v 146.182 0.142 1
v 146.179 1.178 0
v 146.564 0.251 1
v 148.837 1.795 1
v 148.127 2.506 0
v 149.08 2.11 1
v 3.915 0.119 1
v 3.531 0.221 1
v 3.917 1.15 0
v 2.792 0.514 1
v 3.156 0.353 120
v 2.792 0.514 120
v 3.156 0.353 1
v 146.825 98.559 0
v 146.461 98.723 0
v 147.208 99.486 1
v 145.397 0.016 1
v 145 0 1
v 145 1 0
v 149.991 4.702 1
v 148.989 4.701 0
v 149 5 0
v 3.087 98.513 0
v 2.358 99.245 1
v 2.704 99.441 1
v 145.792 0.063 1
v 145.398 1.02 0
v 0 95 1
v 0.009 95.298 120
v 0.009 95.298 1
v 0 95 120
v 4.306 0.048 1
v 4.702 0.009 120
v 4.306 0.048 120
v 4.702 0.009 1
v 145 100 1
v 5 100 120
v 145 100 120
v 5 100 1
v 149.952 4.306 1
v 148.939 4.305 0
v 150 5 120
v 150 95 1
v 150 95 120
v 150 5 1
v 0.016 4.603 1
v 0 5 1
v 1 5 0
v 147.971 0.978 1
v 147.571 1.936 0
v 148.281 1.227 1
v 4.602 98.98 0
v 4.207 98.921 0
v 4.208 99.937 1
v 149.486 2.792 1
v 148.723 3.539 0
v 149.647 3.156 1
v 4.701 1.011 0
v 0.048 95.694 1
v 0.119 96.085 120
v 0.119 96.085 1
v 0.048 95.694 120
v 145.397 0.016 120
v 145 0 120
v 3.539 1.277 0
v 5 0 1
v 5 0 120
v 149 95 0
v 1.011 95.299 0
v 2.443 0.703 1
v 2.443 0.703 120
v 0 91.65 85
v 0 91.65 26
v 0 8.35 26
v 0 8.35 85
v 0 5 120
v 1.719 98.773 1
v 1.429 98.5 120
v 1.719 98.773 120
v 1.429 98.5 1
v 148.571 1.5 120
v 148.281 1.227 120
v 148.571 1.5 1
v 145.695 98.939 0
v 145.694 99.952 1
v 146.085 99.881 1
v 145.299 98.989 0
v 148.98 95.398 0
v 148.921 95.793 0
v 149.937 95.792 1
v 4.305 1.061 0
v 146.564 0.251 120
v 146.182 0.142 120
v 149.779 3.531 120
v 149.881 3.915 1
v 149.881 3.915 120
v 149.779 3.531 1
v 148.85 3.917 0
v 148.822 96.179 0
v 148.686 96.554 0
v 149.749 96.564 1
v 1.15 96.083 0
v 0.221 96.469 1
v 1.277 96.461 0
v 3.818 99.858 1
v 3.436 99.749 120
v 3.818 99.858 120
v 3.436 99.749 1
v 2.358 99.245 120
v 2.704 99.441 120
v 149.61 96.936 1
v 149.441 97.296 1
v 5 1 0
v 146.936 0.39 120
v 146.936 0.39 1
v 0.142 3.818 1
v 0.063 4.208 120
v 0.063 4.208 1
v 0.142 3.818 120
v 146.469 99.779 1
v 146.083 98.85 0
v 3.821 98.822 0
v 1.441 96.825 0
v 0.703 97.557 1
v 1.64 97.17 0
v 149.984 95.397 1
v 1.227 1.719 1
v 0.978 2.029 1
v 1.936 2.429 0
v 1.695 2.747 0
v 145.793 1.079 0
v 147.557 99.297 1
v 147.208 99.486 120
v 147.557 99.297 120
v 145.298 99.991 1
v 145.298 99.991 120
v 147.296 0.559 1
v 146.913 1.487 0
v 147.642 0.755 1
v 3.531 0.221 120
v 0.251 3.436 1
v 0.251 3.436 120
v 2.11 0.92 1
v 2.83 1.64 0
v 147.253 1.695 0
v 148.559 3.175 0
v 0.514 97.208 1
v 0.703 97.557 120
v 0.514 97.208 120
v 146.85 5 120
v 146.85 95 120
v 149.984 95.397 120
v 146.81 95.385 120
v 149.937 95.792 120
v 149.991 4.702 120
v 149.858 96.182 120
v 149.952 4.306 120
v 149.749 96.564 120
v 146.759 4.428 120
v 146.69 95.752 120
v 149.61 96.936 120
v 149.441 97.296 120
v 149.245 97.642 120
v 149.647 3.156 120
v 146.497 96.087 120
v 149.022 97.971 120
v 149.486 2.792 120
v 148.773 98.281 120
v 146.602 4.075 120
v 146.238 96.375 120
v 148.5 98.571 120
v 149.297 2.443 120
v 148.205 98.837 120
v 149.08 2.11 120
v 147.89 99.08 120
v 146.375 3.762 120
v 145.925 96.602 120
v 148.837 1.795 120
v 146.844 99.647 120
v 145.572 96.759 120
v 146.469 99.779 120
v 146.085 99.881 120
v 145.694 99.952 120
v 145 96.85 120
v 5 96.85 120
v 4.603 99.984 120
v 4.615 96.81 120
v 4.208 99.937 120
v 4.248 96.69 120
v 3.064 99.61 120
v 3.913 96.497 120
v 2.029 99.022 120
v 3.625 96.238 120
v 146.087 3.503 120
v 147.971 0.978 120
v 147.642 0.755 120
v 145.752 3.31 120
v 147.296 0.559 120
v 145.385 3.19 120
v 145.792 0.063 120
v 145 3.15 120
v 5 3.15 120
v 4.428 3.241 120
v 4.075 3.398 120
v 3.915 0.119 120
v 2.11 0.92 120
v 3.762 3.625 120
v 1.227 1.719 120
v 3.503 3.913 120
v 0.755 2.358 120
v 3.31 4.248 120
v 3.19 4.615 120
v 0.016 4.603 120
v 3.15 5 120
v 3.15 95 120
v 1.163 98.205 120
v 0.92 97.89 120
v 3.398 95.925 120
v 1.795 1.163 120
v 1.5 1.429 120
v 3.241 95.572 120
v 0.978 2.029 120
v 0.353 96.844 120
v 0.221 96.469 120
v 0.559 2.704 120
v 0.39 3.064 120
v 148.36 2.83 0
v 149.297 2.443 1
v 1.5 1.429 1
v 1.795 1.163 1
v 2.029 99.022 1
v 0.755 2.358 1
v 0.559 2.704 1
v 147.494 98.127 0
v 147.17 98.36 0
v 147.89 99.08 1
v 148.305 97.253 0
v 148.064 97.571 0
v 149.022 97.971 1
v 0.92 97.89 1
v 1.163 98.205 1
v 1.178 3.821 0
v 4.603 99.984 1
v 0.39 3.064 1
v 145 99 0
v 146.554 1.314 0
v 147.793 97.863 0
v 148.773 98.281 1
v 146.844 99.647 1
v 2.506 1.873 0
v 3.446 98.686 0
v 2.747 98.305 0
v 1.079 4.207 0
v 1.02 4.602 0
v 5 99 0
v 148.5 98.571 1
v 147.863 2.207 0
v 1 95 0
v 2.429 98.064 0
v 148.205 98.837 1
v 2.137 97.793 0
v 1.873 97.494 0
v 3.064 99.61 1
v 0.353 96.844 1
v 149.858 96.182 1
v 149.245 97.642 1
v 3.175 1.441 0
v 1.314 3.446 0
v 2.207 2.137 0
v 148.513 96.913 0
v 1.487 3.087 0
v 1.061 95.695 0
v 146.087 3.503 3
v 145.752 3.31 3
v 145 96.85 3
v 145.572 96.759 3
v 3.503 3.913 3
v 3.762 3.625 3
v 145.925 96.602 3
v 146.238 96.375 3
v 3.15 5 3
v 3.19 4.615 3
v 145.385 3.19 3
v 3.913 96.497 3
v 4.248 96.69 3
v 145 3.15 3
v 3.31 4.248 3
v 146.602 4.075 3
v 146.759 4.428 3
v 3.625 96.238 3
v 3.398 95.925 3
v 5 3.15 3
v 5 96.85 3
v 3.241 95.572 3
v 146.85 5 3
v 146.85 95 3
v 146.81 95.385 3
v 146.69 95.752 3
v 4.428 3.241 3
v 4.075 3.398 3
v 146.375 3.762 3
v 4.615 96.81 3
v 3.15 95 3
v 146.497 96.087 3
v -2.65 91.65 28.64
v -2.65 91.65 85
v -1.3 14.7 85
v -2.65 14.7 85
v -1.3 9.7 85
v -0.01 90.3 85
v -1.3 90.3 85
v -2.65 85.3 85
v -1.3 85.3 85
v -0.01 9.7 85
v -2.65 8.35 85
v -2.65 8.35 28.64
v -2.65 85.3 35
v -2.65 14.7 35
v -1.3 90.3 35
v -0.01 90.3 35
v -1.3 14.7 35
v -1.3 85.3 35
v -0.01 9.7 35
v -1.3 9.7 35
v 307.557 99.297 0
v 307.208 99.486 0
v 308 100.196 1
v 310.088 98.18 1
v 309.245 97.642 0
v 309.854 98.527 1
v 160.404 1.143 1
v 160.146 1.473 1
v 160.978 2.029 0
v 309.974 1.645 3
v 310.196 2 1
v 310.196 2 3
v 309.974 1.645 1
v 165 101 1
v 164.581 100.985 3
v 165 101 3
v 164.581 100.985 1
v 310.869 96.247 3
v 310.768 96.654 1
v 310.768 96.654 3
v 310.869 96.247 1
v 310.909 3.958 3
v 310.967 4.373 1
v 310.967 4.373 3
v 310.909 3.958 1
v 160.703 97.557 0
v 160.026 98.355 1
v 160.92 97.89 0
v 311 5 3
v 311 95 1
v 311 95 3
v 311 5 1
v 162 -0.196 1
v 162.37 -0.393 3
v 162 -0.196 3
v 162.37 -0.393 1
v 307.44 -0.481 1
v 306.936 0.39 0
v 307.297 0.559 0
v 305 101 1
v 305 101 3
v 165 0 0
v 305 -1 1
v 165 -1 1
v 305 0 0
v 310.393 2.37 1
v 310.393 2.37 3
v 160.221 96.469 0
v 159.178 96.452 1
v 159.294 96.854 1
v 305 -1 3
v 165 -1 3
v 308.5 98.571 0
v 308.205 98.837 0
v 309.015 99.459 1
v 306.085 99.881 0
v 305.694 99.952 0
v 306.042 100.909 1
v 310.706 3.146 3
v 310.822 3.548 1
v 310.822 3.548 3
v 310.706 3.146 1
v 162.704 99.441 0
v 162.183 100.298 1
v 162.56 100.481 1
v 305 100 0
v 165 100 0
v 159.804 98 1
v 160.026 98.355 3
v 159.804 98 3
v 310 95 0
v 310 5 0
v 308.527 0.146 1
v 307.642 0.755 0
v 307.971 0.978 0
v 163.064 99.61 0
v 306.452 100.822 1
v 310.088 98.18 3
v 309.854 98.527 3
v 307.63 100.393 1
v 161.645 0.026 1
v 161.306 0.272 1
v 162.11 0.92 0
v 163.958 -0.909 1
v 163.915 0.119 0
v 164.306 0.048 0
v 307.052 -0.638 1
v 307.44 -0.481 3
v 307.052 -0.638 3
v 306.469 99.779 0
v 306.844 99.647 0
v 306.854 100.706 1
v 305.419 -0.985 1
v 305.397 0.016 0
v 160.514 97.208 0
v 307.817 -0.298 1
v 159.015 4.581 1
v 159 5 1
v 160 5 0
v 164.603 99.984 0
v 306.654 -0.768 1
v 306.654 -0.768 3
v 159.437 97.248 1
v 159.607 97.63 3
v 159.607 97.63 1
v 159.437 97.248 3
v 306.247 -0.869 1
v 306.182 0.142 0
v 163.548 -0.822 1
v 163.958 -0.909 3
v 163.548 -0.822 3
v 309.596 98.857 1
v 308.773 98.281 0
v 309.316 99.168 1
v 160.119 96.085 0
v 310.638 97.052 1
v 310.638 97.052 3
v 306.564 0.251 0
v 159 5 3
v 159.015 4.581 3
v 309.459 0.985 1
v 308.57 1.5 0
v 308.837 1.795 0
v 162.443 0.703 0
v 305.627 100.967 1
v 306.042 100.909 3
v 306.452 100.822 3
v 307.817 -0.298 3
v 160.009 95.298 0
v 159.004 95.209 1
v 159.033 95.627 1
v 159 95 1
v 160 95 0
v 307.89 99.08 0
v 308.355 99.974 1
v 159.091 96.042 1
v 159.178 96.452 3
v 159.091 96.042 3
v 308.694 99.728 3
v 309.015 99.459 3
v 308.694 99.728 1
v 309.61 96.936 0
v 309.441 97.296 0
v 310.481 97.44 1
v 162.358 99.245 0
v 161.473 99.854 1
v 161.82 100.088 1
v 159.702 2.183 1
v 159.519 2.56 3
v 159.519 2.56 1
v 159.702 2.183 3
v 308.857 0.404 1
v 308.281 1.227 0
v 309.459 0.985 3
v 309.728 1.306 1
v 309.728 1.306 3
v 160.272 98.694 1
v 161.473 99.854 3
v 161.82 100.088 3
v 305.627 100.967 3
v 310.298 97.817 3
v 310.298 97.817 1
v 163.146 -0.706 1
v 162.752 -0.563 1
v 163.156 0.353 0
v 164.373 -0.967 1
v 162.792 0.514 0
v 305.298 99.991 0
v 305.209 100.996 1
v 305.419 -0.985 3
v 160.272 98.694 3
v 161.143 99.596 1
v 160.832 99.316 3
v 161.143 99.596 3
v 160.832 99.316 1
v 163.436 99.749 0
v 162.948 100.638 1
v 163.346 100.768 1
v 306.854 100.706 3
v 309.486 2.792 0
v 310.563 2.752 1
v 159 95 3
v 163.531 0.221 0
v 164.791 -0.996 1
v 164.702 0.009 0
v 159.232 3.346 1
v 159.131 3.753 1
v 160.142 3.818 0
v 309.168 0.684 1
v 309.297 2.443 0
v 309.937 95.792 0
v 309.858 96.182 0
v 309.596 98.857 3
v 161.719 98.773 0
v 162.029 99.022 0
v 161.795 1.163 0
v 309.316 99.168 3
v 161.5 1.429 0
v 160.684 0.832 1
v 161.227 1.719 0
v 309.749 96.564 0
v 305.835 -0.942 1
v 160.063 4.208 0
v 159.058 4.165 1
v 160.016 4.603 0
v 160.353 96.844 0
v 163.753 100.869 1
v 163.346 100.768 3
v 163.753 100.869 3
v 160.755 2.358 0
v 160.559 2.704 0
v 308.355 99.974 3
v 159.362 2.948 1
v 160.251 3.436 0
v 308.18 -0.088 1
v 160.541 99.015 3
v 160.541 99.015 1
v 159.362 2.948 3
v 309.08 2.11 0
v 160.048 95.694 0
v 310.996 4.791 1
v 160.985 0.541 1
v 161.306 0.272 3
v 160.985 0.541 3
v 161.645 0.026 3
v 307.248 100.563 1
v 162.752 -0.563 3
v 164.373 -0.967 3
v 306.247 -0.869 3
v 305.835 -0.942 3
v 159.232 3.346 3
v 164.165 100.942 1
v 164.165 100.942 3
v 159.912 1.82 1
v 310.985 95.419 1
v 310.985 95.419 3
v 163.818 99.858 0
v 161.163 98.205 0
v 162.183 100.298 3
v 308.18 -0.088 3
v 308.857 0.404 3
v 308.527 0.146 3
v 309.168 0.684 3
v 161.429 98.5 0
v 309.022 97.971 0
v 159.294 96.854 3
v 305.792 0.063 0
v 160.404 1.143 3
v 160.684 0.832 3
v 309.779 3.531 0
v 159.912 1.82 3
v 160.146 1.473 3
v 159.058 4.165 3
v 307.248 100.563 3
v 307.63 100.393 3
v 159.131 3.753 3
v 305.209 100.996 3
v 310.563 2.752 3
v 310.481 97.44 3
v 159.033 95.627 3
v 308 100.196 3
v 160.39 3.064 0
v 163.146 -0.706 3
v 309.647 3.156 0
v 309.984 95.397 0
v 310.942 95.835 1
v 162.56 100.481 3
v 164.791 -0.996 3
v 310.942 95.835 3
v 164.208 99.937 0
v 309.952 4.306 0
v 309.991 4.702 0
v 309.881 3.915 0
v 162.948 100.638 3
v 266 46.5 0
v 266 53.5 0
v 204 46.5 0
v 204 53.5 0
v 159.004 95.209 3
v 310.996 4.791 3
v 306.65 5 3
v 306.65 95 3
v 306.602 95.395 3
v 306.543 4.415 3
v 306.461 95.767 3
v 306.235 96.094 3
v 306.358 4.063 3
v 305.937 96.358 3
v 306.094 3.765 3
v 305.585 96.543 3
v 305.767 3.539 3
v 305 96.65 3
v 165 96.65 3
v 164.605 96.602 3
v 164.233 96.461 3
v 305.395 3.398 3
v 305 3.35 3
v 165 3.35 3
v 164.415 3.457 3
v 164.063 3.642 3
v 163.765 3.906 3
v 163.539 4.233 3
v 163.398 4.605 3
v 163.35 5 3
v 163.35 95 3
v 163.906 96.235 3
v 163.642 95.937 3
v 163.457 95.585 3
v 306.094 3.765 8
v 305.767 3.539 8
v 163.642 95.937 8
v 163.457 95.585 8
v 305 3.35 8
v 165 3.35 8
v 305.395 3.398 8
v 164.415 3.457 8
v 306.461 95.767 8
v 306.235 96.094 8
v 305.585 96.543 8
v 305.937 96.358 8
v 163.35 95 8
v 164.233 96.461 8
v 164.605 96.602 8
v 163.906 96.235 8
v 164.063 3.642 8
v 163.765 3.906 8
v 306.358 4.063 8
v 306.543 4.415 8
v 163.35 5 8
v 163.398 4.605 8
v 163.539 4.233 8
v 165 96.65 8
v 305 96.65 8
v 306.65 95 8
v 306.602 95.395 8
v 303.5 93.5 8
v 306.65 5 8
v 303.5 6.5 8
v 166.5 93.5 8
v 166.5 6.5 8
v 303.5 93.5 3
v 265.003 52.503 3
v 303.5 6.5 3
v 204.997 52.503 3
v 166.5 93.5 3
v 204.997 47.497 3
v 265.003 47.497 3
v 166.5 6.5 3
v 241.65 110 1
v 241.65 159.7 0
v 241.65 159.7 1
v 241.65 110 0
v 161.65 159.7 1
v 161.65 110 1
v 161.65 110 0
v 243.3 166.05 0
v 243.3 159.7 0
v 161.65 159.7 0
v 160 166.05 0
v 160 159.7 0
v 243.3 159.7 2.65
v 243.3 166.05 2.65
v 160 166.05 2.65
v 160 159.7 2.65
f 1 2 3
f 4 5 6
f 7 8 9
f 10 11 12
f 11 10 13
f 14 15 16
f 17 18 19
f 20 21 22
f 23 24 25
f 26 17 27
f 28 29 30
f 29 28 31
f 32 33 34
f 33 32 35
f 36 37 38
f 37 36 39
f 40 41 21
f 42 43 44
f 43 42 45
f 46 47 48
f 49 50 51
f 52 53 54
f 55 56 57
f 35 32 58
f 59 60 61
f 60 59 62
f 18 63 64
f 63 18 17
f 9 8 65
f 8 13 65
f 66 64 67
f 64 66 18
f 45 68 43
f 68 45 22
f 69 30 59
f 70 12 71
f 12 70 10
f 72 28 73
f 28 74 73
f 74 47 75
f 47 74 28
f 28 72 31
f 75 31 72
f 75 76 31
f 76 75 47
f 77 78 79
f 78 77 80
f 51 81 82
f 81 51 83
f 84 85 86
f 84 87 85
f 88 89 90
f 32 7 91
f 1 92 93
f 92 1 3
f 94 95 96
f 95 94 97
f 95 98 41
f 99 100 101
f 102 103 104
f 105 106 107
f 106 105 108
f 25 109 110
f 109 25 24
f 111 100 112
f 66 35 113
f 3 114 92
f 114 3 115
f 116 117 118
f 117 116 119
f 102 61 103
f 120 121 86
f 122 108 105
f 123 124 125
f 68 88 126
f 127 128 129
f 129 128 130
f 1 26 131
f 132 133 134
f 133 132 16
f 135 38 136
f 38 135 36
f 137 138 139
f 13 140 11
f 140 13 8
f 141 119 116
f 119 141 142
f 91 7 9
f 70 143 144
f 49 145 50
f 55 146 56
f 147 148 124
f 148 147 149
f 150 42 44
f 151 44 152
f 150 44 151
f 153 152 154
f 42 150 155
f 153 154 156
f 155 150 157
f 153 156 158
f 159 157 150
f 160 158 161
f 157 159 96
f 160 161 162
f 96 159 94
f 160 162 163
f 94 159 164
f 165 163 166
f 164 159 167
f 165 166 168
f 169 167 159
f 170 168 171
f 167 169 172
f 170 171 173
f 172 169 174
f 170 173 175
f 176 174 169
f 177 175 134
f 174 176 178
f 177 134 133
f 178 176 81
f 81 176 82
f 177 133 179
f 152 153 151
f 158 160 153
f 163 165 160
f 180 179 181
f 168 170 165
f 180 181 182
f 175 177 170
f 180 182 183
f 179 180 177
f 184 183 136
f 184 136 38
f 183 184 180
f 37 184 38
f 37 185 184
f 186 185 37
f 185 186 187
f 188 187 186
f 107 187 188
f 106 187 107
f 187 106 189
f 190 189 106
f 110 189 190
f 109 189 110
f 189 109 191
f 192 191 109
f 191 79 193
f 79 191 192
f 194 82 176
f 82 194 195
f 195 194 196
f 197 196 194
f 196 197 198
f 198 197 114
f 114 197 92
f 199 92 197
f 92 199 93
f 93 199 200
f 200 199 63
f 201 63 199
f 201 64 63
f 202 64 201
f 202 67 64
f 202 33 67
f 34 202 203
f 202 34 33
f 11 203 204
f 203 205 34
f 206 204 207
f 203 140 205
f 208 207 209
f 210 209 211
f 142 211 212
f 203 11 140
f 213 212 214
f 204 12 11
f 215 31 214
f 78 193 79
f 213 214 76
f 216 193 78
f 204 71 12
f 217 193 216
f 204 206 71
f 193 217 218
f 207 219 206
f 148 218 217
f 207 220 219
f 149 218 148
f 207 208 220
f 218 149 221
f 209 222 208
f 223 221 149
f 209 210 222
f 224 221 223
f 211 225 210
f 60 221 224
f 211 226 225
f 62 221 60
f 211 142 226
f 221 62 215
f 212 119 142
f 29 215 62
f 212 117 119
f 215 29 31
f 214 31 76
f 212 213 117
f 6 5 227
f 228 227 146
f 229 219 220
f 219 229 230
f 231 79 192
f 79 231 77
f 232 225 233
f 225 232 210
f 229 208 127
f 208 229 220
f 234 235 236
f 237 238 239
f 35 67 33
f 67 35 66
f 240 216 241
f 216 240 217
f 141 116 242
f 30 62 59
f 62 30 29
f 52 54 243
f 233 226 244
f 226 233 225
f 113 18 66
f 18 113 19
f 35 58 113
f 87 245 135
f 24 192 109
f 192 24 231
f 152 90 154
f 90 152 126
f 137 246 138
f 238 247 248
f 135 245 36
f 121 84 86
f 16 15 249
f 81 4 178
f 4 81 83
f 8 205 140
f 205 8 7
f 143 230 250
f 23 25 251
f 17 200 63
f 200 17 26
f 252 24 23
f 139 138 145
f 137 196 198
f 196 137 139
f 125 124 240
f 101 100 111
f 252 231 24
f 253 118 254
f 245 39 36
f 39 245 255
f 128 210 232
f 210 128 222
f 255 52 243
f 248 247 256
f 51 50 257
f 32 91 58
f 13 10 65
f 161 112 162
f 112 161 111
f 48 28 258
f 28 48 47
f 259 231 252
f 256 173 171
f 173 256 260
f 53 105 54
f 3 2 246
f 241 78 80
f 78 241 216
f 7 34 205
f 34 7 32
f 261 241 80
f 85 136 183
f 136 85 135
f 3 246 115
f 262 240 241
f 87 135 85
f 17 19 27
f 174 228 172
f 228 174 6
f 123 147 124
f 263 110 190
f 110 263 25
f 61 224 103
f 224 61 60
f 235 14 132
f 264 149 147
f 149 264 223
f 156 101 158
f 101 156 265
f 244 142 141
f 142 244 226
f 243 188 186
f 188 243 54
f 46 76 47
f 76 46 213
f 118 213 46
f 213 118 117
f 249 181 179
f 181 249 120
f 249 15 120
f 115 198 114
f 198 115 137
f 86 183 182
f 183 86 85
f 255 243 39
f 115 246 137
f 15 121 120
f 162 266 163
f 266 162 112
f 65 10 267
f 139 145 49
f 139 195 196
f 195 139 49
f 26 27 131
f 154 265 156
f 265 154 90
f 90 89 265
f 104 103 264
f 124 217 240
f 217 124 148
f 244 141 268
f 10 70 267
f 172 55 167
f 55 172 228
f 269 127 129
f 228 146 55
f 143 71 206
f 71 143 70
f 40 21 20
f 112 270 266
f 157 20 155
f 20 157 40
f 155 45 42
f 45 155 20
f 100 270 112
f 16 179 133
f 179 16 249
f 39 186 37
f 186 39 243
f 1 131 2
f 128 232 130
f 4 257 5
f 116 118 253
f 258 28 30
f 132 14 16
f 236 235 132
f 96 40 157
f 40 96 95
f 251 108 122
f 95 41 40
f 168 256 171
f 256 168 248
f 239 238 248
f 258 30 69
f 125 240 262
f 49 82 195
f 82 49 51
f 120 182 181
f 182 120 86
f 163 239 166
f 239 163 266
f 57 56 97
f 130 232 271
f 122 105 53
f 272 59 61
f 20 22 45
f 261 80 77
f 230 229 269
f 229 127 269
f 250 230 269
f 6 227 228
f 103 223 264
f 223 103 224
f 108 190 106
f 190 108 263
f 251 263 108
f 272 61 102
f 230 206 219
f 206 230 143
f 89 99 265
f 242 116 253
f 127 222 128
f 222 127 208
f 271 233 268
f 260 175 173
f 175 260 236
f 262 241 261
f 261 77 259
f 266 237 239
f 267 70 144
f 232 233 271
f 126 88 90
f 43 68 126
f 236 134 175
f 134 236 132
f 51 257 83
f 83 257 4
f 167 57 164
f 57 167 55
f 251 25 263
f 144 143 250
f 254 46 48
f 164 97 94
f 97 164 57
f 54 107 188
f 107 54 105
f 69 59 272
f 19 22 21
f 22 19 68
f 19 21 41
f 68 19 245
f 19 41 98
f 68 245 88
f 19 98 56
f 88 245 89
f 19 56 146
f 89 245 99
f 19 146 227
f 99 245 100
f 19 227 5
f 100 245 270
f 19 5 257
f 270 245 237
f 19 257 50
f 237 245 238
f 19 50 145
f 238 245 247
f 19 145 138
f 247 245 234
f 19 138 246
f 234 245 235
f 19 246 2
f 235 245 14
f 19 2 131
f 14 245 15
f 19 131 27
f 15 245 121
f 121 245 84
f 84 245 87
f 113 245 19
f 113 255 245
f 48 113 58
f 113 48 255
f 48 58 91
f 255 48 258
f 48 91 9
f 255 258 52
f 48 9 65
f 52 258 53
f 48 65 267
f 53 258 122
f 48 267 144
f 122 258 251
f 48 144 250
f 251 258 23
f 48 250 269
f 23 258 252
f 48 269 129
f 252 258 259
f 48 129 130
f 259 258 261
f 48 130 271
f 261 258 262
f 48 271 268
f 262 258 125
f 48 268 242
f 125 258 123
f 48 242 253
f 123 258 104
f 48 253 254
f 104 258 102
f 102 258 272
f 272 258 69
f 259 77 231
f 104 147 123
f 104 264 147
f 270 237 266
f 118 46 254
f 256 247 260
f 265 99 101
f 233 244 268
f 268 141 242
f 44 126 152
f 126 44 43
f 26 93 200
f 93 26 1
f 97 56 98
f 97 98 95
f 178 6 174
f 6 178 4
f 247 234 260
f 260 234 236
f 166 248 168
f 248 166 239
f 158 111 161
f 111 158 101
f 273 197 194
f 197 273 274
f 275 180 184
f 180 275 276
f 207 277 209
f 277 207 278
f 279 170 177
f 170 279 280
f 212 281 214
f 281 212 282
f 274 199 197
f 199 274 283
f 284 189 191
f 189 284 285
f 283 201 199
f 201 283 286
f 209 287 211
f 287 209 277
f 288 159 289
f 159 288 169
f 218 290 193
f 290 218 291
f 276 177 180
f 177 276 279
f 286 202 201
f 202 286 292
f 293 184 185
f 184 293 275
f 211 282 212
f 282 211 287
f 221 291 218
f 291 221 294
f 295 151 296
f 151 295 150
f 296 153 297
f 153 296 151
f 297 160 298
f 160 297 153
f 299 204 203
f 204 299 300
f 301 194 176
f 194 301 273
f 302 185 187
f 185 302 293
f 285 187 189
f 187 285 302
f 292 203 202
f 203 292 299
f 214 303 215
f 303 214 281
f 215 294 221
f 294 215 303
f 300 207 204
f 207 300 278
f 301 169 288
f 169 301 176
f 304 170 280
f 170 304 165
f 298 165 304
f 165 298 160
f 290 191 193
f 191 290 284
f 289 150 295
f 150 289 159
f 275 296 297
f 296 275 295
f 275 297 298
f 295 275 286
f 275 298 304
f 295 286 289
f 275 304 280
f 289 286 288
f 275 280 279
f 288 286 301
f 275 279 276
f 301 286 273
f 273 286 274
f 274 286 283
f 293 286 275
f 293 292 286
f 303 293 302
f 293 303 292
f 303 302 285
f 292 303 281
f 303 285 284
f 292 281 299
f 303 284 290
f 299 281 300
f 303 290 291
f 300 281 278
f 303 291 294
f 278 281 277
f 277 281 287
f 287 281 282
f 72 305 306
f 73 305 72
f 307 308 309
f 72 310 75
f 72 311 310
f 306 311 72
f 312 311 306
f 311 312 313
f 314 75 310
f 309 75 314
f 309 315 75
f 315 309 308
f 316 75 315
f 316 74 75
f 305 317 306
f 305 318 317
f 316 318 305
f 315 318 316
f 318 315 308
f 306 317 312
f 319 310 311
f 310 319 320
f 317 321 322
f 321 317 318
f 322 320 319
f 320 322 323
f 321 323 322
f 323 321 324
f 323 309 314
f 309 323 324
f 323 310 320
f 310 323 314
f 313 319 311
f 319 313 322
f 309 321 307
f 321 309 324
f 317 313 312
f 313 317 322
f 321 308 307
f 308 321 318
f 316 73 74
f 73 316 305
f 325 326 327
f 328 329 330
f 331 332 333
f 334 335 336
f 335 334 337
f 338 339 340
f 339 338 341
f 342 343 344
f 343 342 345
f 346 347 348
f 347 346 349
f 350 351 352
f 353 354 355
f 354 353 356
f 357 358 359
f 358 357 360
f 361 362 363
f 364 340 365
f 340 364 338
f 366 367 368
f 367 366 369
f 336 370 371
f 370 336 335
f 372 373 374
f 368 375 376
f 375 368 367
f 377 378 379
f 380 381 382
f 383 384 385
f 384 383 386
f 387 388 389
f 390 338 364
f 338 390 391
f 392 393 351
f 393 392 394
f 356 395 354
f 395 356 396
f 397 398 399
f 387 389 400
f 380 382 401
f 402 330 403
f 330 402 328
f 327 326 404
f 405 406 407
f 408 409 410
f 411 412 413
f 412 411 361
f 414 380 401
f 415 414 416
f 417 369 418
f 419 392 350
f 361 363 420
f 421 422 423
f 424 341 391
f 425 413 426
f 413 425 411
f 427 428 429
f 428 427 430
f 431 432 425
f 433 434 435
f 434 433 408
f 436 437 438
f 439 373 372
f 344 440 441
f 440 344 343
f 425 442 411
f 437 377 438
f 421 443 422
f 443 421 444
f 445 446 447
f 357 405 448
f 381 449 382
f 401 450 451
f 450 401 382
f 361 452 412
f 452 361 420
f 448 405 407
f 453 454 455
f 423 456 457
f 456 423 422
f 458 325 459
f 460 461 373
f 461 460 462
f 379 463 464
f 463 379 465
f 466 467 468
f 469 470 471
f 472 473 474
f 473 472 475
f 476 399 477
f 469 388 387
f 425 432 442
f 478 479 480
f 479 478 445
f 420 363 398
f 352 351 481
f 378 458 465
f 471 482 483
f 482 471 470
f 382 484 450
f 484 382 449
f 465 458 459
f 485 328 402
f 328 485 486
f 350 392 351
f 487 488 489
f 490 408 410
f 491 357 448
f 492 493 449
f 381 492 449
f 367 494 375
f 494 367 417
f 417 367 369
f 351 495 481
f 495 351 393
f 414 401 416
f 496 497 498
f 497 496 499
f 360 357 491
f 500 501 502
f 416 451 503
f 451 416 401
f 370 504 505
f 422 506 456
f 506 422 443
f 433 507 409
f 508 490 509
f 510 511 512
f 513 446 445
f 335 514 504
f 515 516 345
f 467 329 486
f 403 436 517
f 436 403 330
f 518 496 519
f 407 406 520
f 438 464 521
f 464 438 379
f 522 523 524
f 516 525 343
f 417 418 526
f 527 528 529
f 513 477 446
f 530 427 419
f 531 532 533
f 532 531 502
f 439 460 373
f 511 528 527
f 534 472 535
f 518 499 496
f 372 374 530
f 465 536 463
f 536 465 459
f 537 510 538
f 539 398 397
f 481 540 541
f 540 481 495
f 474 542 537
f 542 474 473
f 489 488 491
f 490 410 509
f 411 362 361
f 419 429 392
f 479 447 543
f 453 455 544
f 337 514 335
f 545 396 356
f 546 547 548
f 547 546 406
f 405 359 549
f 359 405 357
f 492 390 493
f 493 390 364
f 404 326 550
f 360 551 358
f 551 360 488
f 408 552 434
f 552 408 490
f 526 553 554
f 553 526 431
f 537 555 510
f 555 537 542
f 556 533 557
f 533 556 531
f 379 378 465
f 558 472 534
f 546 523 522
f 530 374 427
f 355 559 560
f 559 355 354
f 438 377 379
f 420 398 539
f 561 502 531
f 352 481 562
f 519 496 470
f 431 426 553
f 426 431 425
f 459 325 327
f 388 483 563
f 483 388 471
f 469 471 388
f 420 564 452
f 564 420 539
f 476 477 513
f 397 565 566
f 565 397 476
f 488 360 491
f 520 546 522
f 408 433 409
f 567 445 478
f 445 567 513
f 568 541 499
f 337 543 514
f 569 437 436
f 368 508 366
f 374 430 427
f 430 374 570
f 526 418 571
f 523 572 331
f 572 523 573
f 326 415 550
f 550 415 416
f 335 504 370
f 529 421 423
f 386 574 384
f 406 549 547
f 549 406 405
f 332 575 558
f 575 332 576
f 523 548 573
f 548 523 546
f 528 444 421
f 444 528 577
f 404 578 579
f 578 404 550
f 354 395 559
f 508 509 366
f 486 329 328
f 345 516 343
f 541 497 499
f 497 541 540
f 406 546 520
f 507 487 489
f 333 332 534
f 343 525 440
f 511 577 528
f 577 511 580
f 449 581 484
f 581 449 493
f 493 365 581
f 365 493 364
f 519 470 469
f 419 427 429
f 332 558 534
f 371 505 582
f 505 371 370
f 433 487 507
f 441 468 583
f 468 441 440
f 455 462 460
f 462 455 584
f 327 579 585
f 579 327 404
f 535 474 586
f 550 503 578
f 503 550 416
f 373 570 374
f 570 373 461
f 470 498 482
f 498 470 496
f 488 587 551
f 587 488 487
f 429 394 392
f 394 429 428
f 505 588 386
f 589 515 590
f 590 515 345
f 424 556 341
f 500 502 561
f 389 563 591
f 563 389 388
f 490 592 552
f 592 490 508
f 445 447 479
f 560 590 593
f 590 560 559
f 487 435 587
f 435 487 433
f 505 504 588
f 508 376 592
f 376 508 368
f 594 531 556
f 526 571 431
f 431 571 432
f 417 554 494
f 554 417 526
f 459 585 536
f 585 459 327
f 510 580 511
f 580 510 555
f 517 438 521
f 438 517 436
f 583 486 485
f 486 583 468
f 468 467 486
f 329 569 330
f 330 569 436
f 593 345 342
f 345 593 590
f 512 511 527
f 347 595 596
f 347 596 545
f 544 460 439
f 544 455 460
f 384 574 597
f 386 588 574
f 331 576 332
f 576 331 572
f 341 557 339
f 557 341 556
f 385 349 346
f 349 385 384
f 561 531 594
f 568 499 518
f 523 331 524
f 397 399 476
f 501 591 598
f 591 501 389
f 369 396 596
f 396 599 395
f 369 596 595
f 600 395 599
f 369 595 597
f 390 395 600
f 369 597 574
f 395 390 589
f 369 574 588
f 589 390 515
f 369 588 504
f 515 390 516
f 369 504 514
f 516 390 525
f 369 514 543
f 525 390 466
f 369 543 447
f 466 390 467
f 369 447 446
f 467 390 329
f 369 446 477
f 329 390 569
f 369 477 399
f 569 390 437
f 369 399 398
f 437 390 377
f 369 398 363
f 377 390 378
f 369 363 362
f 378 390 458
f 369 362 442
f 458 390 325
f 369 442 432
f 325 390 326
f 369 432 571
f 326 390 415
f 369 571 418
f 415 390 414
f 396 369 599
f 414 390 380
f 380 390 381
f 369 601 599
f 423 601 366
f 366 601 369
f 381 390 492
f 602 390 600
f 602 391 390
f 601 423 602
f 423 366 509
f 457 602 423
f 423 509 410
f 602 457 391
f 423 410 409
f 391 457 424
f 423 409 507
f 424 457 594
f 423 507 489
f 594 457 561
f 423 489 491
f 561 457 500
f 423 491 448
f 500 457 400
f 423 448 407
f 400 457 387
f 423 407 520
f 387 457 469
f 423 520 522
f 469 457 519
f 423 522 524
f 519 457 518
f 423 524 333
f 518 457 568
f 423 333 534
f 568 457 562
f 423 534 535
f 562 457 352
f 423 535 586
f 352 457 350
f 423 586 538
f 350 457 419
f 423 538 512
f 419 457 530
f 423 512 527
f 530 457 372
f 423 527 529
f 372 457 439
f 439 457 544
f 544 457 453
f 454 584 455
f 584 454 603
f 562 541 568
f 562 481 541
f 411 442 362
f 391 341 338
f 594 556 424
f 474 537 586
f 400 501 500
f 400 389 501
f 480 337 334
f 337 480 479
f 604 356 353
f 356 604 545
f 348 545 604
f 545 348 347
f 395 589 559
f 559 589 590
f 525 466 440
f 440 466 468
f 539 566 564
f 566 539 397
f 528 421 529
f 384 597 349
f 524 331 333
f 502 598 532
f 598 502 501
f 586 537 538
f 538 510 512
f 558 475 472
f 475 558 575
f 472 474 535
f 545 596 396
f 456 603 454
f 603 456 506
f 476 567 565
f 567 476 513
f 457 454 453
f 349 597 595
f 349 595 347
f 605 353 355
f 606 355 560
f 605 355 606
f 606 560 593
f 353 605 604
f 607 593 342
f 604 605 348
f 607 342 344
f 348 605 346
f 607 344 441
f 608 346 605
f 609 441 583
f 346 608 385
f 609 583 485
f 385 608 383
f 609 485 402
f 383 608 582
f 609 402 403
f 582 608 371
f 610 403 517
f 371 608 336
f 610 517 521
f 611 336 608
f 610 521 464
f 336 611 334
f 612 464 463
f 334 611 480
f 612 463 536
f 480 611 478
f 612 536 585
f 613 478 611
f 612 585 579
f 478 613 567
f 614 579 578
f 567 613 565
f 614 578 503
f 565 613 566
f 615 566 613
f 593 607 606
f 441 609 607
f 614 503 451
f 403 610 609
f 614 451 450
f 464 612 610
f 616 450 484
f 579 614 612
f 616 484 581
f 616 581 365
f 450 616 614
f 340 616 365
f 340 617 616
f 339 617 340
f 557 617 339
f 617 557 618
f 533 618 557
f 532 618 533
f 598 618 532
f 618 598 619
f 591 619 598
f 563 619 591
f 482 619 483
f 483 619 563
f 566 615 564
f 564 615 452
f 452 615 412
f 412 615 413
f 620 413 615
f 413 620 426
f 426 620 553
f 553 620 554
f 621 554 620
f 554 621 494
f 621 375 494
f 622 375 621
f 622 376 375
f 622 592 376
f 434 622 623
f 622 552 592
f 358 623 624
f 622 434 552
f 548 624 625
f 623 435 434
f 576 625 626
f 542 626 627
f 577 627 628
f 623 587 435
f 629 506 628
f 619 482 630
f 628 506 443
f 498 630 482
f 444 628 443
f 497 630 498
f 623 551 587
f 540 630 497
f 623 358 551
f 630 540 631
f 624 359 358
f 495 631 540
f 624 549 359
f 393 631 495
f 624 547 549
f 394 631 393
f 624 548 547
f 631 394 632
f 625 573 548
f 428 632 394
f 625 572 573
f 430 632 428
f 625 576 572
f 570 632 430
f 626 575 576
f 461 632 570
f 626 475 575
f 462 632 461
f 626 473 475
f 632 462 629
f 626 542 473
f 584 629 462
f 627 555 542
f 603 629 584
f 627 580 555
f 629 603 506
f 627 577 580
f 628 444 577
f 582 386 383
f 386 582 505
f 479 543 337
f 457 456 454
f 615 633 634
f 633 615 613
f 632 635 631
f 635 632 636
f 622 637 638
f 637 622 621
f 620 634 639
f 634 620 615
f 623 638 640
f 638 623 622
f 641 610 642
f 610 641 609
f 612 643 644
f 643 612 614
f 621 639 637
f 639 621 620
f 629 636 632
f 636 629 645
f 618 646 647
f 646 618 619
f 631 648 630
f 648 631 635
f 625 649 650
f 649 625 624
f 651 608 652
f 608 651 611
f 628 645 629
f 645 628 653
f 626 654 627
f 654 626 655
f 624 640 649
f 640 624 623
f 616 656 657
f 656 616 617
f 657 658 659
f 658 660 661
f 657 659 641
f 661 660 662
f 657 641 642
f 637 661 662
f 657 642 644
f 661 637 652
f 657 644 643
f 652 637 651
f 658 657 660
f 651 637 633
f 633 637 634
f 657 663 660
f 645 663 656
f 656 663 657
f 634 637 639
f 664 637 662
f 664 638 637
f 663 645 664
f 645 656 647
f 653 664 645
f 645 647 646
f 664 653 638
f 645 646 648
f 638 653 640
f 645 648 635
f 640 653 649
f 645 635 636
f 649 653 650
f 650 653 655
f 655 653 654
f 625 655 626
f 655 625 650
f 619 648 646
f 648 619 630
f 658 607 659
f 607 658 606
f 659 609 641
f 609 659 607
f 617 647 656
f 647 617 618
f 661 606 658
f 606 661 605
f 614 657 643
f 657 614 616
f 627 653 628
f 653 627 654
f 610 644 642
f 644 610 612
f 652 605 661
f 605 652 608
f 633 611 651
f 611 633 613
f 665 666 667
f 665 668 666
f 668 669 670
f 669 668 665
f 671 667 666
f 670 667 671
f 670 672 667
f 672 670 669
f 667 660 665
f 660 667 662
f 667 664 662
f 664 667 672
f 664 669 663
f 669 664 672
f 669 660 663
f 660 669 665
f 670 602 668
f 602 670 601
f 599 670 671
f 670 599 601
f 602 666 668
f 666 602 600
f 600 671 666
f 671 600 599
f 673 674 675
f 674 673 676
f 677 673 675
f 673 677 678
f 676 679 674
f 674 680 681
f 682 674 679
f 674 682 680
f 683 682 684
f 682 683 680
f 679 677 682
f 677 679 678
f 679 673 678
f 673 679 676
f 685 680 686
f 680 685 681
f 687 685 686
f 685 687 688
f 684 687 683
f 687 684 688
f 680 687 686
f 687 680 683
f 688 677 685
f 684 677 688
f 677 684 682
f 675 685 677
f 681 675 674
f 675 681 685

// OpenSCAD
// Main part file. Open in OpenSCAD: F5 preview, F6 render.
// Viewed from above, X is to the right (width) and Y is away from you (depth).
//
// The box is open at the top. The lid is a plate the full outer size of the
// box, with a ring underneath that steps inwards and drops inside the box
// walls to hold the lid in place.
//
// The front of the box can carry a holder for a sign: a channel on the
// outside of the wall, open at the top, that a flat sign card drops into. The
// sides of the channel overhang the edges of the card to hold it against the
// wall.
//
// Notes:
// - The lid is modelled upside down, plate on the bed, so it prints without
//   supports.
// - Keep comments on parameters to a single line: the single-file build
//   (make dist) drops comments that continue over several lines.

/* [Part] */
part = "all"; // [box, lid, sign, all]

/* [Box] */
width           = 150; // mm, outer, along X
depth           = 100; // mm, outer, along Y
height          = 120; // mm, outer, box only, not including the lid
wall_thickness  = 0;   // mm, side walls and the lid ring, 0 = auto from the box size
floor_thickness = 3;   // mm

/* [Finish] */
corner_radius = 5; // mm, vertical corners of the box and lid
edge_chamfer  = 1; // mm, 45 degree chamfer on the bottom edge of the box and the top edge of the lid
slot_chamfer  = 1; // mm, 45 degree chamfer round the top of the money slot
lid_overhang  = 1; // mm, how far the lid sticks out past the box on every side, hides the seam

/* [Printing] */
line_width = 0.45; // mm, slicer extrusion width, auto sizes are a whole number of lines

/* [Lid] */
lid_thickness = 3;   // mm, top plate
ring_height   = 5;   // mm, how far the ring under the lid reaches down into the box
clearance     = 0.2; // mm, gap on each side between the lid ring and the box walls
slot_length   = 60;  // mm, along X
slot_width    = 5;   // mm, along Y

/* [Sign] */
add_sign_holder    = true;  // add a holder for a sign card on the front of the box
sign_on_short_side = true; // put the holder on a short side of the box instead of a long side
sign_width         = 80;   // mm, card, the part that slides into the holder
sign_height        = 50;   // mm, card, the part that slides into the holder, not including the lip
sign_thickness     = 1;     // mm, card
sign_overhang      = 5;     // mm, how far each side of the holder covers the edge of the card
sign_base          = 0;     // mm, thickness of the ledge the card stands on, 0 = auto (same as the sides)
sign_clearance     = 0.3;   // mm, gap around the card in the holder
sign_holder_thickness = 0;  // mm, sides and front of the holder, 0 = auto (3 lines)

/* [Hidden] */
part_gap = 10; // mm, space between the parts when part = "all"
eps      = 0.01;
$fa      = 4;
$fs      = 0.4;

// Auto wall: about 1 mm per 50 mm of the largest dimension, clamped to
// 1.2-4 mm, then rounded up to a whole number of lines.
wall = wall_thickness > 0
    ? wall_thickness
    : ceil(min(max(max(width, depth, height) / 50, 1.2), 4) / line_width) * line_width;

// Inset from the outer edge to the outside and inside of the lid ring.
ring_outer_inset = wall + clearance;
ring_inner_inset = ring_outer_inset + wall;

// The sign holder goes on the front (Y = 0) face when that is the side asked
// for, otherwise on the left (X = 0) face.
sign_along_x = (width >= depth) != sign_on_short_side;
sign_face    = sign_along_x ? width : depth;

// Sign holder sizes: the channel the card sits in, and the holder overall.
holder_wall         = sign_holder_thickness > 0 ? sign_holder_thickness : 3 * line_width;
sign_slot_width     = sign_width + 2 * sign_clearance;
sign_slot_thickness = sign_thickness + sign_clearance;
holder_width        = sign_slot_width + 2 * holder_wall;
holder_thickness    = sign_slot_thickness + holder_wall;
// Width of the frame around the sign as seen from the front: the sides of the
// holder, the ledge at the bottom and the lip on the card at the top.
frame_border        = holder_wall + sign_overhang;
holder_base         = sign_base > 0 ? sign_base : frame_border;
holder_height       = holder_base + sign_height; // card top, below the lip, is flush with the holder top
holder_z            = (height - holder_height - frame_border) / 2; // holder and lip centred vertically on the box

assert(ring_height < height - floor_thickness, "ring_height must be less than the inside height");
assert(slot_length < width - 2 * ring_inner_inset && slot_width < depth - 2 * ring_inner_inset,
       "slot must fit inside the lid ring");
assert(2 * corner_radius <= min(width, depth), "corner_radius must be at most half the width and depth");
assert(edge_chamfer < floor_thickness && edge_chamfer < lid_thickness,
       "edge_chamfer must be less than floor_thickness and lid_thickness");
assert(slot_chamfer < lid_thickness, "slot_chamfer must be less than lid_thickness");
assert(!add_sign_holder || holder_width <= sign_face - 2 * corner_radius,
       "sign holder is wider than the flat part of the side of the box");
assert(2 * sign_overhang < sign_slot_width, "sign_overhang must be less than half the sign width");
assert(sign_overhang > sign_clearance, "sign_overhang must be more than sign_clearance");
assert(!add_sign_holder || holder_z >= holder_thickness,
       "sign holder is too tall for the box, reduce sign_height or sign_base");

echo(wall = wall);

// In local coordinates: the holder is centred along X on a face running from
// 0 to face_length, and sticks out towards -Y from the wall at Y = 0.
module sign_holder(face_length) {
    translate([(face_length - holder_width) / 2, -holder_thickness, holder_z]) {
        difference() {
            cube([holder_width, holder_thickness + eps, holder_height]);
            // Channel the card drops into. Stops eps short of the box wall so
            // its back face isn't coplanar with the wall (flickers in preview).
            translate([holder_wall, holder_wall, holder_base])
                cube([sign_slot_width, sign_slot_thickness - eps, holder_height]);
            // Window in the front, leaving the overhang on each side.
            translate([holder_wall + sign_overhang, -eps, holder_base])
                cube([sign_slot_width - 2 * sign_overhang, holder_wall + 2 * eps, holder_height]);
        }
        // 45 degree chamfer under the holder, so it prints without supports.
        hull() {
            translate([0, 0, -eps])
                cube([holder_width, holder_thickness + eps, eps]);
            translate([0, holder_thickness, -holder_thickness])
                cube([holder_width, eps, eps]);
        }
    }
}

// The box outline seen from above, shrunk by inset on every side (grown, if
// inset is negative), with the corner radius changed to match so the corners
// stay concentric.
module outline(inset = 0) {
    r = max(corner_radius - inset, 0);
    translate([inset + r, inset + r])
        offset(r = r) square([width - 2 * (inset + r), depth - 2 * (inset + r)]);
}

// The outline, shrunk by inset, extruded to height h, with a 45 degree
// chamfer of size c round the bottom edge.
module chamfered_slab(h, c, inset = 0) {
    hull() {
        linear_extrude(eps) outline(inset + c);
        translate([0, 0, c]) linear_extrude(h - c) outline(inset);
    }
}

module box() {
    difference() {
        chamfered_slab(height, edge_chamfer);
        translate([0, 0, floor_thickness])
            linear_extrude(height) outline(wall);
    }
    if (add_sign_holder) {
        if (sign_along_x) sign_holder(width);
        else mirror([1, -1, 0]) sign_holder(depth); // swap X and Y
    }
}

module lid() {
    difference() {
        union() {
            chamfered_slab(lid_thickness, edge_chamfer, -lid_overhang); // top face is on the bed
            translate([0, 0, lid_thickness - eps])
                linear_extrude(ring_height + eps) outline(ring_outer_inset);
        }
        // Hollow out the ring.
        translate([0, 0, lid_thickness])
            linear_extrude(ring_height + eps) outline(ring_inner_inset);
        // Money slot, widened by the chamfer at the top face.
        translate([(width - slot_length) / 2, (depth - slot_width) / 2, 0])
            hull() {
                translate([-slot_chamfer, -slot_chamfer, -eps])
                    cube([slot_length + 2 * slot_chamfer, slot_width + 2 * slot_chamfer, eps]);
                translate([0, 0, slot_chamfer])
                    cube([slot_length, slot_width, lid_thickness - slot_chamfer + eps]);
            }
    }
}

// Printed back down. Y is up when the card is in the holder. The lip along the
// top rests on top of the holder and finishes the frame: it is as wide as the
// holder, as tall as the frame sides, and stands out flush with the holder
// front. Push it up to slide the card out. The card below the lip is
// sign_clearance short of the holder, so the lip, not the bottom of the card,
// is what it rests on.
module sign() {
    card_height = sign_height - sign_clearance;
    translate([(holder_width - sign_width) / 2, 0, 0])
        cube([sign_width, card_height + eps, sign_thickness]);
    translate([0, card_height, 0])
        cube([holder_width, frame_border, holder_thickness]);
}

if (part == "box" || part == "all") box();
if (part == "lid") lid();
if (part == "sign") sign();
if (part == "all") {
    translate([width + part_gap, 0, 0]) lid();
    if (add_sign_holder) translate([width + part_gap, depth + part_gap, 0]) sign();
}
